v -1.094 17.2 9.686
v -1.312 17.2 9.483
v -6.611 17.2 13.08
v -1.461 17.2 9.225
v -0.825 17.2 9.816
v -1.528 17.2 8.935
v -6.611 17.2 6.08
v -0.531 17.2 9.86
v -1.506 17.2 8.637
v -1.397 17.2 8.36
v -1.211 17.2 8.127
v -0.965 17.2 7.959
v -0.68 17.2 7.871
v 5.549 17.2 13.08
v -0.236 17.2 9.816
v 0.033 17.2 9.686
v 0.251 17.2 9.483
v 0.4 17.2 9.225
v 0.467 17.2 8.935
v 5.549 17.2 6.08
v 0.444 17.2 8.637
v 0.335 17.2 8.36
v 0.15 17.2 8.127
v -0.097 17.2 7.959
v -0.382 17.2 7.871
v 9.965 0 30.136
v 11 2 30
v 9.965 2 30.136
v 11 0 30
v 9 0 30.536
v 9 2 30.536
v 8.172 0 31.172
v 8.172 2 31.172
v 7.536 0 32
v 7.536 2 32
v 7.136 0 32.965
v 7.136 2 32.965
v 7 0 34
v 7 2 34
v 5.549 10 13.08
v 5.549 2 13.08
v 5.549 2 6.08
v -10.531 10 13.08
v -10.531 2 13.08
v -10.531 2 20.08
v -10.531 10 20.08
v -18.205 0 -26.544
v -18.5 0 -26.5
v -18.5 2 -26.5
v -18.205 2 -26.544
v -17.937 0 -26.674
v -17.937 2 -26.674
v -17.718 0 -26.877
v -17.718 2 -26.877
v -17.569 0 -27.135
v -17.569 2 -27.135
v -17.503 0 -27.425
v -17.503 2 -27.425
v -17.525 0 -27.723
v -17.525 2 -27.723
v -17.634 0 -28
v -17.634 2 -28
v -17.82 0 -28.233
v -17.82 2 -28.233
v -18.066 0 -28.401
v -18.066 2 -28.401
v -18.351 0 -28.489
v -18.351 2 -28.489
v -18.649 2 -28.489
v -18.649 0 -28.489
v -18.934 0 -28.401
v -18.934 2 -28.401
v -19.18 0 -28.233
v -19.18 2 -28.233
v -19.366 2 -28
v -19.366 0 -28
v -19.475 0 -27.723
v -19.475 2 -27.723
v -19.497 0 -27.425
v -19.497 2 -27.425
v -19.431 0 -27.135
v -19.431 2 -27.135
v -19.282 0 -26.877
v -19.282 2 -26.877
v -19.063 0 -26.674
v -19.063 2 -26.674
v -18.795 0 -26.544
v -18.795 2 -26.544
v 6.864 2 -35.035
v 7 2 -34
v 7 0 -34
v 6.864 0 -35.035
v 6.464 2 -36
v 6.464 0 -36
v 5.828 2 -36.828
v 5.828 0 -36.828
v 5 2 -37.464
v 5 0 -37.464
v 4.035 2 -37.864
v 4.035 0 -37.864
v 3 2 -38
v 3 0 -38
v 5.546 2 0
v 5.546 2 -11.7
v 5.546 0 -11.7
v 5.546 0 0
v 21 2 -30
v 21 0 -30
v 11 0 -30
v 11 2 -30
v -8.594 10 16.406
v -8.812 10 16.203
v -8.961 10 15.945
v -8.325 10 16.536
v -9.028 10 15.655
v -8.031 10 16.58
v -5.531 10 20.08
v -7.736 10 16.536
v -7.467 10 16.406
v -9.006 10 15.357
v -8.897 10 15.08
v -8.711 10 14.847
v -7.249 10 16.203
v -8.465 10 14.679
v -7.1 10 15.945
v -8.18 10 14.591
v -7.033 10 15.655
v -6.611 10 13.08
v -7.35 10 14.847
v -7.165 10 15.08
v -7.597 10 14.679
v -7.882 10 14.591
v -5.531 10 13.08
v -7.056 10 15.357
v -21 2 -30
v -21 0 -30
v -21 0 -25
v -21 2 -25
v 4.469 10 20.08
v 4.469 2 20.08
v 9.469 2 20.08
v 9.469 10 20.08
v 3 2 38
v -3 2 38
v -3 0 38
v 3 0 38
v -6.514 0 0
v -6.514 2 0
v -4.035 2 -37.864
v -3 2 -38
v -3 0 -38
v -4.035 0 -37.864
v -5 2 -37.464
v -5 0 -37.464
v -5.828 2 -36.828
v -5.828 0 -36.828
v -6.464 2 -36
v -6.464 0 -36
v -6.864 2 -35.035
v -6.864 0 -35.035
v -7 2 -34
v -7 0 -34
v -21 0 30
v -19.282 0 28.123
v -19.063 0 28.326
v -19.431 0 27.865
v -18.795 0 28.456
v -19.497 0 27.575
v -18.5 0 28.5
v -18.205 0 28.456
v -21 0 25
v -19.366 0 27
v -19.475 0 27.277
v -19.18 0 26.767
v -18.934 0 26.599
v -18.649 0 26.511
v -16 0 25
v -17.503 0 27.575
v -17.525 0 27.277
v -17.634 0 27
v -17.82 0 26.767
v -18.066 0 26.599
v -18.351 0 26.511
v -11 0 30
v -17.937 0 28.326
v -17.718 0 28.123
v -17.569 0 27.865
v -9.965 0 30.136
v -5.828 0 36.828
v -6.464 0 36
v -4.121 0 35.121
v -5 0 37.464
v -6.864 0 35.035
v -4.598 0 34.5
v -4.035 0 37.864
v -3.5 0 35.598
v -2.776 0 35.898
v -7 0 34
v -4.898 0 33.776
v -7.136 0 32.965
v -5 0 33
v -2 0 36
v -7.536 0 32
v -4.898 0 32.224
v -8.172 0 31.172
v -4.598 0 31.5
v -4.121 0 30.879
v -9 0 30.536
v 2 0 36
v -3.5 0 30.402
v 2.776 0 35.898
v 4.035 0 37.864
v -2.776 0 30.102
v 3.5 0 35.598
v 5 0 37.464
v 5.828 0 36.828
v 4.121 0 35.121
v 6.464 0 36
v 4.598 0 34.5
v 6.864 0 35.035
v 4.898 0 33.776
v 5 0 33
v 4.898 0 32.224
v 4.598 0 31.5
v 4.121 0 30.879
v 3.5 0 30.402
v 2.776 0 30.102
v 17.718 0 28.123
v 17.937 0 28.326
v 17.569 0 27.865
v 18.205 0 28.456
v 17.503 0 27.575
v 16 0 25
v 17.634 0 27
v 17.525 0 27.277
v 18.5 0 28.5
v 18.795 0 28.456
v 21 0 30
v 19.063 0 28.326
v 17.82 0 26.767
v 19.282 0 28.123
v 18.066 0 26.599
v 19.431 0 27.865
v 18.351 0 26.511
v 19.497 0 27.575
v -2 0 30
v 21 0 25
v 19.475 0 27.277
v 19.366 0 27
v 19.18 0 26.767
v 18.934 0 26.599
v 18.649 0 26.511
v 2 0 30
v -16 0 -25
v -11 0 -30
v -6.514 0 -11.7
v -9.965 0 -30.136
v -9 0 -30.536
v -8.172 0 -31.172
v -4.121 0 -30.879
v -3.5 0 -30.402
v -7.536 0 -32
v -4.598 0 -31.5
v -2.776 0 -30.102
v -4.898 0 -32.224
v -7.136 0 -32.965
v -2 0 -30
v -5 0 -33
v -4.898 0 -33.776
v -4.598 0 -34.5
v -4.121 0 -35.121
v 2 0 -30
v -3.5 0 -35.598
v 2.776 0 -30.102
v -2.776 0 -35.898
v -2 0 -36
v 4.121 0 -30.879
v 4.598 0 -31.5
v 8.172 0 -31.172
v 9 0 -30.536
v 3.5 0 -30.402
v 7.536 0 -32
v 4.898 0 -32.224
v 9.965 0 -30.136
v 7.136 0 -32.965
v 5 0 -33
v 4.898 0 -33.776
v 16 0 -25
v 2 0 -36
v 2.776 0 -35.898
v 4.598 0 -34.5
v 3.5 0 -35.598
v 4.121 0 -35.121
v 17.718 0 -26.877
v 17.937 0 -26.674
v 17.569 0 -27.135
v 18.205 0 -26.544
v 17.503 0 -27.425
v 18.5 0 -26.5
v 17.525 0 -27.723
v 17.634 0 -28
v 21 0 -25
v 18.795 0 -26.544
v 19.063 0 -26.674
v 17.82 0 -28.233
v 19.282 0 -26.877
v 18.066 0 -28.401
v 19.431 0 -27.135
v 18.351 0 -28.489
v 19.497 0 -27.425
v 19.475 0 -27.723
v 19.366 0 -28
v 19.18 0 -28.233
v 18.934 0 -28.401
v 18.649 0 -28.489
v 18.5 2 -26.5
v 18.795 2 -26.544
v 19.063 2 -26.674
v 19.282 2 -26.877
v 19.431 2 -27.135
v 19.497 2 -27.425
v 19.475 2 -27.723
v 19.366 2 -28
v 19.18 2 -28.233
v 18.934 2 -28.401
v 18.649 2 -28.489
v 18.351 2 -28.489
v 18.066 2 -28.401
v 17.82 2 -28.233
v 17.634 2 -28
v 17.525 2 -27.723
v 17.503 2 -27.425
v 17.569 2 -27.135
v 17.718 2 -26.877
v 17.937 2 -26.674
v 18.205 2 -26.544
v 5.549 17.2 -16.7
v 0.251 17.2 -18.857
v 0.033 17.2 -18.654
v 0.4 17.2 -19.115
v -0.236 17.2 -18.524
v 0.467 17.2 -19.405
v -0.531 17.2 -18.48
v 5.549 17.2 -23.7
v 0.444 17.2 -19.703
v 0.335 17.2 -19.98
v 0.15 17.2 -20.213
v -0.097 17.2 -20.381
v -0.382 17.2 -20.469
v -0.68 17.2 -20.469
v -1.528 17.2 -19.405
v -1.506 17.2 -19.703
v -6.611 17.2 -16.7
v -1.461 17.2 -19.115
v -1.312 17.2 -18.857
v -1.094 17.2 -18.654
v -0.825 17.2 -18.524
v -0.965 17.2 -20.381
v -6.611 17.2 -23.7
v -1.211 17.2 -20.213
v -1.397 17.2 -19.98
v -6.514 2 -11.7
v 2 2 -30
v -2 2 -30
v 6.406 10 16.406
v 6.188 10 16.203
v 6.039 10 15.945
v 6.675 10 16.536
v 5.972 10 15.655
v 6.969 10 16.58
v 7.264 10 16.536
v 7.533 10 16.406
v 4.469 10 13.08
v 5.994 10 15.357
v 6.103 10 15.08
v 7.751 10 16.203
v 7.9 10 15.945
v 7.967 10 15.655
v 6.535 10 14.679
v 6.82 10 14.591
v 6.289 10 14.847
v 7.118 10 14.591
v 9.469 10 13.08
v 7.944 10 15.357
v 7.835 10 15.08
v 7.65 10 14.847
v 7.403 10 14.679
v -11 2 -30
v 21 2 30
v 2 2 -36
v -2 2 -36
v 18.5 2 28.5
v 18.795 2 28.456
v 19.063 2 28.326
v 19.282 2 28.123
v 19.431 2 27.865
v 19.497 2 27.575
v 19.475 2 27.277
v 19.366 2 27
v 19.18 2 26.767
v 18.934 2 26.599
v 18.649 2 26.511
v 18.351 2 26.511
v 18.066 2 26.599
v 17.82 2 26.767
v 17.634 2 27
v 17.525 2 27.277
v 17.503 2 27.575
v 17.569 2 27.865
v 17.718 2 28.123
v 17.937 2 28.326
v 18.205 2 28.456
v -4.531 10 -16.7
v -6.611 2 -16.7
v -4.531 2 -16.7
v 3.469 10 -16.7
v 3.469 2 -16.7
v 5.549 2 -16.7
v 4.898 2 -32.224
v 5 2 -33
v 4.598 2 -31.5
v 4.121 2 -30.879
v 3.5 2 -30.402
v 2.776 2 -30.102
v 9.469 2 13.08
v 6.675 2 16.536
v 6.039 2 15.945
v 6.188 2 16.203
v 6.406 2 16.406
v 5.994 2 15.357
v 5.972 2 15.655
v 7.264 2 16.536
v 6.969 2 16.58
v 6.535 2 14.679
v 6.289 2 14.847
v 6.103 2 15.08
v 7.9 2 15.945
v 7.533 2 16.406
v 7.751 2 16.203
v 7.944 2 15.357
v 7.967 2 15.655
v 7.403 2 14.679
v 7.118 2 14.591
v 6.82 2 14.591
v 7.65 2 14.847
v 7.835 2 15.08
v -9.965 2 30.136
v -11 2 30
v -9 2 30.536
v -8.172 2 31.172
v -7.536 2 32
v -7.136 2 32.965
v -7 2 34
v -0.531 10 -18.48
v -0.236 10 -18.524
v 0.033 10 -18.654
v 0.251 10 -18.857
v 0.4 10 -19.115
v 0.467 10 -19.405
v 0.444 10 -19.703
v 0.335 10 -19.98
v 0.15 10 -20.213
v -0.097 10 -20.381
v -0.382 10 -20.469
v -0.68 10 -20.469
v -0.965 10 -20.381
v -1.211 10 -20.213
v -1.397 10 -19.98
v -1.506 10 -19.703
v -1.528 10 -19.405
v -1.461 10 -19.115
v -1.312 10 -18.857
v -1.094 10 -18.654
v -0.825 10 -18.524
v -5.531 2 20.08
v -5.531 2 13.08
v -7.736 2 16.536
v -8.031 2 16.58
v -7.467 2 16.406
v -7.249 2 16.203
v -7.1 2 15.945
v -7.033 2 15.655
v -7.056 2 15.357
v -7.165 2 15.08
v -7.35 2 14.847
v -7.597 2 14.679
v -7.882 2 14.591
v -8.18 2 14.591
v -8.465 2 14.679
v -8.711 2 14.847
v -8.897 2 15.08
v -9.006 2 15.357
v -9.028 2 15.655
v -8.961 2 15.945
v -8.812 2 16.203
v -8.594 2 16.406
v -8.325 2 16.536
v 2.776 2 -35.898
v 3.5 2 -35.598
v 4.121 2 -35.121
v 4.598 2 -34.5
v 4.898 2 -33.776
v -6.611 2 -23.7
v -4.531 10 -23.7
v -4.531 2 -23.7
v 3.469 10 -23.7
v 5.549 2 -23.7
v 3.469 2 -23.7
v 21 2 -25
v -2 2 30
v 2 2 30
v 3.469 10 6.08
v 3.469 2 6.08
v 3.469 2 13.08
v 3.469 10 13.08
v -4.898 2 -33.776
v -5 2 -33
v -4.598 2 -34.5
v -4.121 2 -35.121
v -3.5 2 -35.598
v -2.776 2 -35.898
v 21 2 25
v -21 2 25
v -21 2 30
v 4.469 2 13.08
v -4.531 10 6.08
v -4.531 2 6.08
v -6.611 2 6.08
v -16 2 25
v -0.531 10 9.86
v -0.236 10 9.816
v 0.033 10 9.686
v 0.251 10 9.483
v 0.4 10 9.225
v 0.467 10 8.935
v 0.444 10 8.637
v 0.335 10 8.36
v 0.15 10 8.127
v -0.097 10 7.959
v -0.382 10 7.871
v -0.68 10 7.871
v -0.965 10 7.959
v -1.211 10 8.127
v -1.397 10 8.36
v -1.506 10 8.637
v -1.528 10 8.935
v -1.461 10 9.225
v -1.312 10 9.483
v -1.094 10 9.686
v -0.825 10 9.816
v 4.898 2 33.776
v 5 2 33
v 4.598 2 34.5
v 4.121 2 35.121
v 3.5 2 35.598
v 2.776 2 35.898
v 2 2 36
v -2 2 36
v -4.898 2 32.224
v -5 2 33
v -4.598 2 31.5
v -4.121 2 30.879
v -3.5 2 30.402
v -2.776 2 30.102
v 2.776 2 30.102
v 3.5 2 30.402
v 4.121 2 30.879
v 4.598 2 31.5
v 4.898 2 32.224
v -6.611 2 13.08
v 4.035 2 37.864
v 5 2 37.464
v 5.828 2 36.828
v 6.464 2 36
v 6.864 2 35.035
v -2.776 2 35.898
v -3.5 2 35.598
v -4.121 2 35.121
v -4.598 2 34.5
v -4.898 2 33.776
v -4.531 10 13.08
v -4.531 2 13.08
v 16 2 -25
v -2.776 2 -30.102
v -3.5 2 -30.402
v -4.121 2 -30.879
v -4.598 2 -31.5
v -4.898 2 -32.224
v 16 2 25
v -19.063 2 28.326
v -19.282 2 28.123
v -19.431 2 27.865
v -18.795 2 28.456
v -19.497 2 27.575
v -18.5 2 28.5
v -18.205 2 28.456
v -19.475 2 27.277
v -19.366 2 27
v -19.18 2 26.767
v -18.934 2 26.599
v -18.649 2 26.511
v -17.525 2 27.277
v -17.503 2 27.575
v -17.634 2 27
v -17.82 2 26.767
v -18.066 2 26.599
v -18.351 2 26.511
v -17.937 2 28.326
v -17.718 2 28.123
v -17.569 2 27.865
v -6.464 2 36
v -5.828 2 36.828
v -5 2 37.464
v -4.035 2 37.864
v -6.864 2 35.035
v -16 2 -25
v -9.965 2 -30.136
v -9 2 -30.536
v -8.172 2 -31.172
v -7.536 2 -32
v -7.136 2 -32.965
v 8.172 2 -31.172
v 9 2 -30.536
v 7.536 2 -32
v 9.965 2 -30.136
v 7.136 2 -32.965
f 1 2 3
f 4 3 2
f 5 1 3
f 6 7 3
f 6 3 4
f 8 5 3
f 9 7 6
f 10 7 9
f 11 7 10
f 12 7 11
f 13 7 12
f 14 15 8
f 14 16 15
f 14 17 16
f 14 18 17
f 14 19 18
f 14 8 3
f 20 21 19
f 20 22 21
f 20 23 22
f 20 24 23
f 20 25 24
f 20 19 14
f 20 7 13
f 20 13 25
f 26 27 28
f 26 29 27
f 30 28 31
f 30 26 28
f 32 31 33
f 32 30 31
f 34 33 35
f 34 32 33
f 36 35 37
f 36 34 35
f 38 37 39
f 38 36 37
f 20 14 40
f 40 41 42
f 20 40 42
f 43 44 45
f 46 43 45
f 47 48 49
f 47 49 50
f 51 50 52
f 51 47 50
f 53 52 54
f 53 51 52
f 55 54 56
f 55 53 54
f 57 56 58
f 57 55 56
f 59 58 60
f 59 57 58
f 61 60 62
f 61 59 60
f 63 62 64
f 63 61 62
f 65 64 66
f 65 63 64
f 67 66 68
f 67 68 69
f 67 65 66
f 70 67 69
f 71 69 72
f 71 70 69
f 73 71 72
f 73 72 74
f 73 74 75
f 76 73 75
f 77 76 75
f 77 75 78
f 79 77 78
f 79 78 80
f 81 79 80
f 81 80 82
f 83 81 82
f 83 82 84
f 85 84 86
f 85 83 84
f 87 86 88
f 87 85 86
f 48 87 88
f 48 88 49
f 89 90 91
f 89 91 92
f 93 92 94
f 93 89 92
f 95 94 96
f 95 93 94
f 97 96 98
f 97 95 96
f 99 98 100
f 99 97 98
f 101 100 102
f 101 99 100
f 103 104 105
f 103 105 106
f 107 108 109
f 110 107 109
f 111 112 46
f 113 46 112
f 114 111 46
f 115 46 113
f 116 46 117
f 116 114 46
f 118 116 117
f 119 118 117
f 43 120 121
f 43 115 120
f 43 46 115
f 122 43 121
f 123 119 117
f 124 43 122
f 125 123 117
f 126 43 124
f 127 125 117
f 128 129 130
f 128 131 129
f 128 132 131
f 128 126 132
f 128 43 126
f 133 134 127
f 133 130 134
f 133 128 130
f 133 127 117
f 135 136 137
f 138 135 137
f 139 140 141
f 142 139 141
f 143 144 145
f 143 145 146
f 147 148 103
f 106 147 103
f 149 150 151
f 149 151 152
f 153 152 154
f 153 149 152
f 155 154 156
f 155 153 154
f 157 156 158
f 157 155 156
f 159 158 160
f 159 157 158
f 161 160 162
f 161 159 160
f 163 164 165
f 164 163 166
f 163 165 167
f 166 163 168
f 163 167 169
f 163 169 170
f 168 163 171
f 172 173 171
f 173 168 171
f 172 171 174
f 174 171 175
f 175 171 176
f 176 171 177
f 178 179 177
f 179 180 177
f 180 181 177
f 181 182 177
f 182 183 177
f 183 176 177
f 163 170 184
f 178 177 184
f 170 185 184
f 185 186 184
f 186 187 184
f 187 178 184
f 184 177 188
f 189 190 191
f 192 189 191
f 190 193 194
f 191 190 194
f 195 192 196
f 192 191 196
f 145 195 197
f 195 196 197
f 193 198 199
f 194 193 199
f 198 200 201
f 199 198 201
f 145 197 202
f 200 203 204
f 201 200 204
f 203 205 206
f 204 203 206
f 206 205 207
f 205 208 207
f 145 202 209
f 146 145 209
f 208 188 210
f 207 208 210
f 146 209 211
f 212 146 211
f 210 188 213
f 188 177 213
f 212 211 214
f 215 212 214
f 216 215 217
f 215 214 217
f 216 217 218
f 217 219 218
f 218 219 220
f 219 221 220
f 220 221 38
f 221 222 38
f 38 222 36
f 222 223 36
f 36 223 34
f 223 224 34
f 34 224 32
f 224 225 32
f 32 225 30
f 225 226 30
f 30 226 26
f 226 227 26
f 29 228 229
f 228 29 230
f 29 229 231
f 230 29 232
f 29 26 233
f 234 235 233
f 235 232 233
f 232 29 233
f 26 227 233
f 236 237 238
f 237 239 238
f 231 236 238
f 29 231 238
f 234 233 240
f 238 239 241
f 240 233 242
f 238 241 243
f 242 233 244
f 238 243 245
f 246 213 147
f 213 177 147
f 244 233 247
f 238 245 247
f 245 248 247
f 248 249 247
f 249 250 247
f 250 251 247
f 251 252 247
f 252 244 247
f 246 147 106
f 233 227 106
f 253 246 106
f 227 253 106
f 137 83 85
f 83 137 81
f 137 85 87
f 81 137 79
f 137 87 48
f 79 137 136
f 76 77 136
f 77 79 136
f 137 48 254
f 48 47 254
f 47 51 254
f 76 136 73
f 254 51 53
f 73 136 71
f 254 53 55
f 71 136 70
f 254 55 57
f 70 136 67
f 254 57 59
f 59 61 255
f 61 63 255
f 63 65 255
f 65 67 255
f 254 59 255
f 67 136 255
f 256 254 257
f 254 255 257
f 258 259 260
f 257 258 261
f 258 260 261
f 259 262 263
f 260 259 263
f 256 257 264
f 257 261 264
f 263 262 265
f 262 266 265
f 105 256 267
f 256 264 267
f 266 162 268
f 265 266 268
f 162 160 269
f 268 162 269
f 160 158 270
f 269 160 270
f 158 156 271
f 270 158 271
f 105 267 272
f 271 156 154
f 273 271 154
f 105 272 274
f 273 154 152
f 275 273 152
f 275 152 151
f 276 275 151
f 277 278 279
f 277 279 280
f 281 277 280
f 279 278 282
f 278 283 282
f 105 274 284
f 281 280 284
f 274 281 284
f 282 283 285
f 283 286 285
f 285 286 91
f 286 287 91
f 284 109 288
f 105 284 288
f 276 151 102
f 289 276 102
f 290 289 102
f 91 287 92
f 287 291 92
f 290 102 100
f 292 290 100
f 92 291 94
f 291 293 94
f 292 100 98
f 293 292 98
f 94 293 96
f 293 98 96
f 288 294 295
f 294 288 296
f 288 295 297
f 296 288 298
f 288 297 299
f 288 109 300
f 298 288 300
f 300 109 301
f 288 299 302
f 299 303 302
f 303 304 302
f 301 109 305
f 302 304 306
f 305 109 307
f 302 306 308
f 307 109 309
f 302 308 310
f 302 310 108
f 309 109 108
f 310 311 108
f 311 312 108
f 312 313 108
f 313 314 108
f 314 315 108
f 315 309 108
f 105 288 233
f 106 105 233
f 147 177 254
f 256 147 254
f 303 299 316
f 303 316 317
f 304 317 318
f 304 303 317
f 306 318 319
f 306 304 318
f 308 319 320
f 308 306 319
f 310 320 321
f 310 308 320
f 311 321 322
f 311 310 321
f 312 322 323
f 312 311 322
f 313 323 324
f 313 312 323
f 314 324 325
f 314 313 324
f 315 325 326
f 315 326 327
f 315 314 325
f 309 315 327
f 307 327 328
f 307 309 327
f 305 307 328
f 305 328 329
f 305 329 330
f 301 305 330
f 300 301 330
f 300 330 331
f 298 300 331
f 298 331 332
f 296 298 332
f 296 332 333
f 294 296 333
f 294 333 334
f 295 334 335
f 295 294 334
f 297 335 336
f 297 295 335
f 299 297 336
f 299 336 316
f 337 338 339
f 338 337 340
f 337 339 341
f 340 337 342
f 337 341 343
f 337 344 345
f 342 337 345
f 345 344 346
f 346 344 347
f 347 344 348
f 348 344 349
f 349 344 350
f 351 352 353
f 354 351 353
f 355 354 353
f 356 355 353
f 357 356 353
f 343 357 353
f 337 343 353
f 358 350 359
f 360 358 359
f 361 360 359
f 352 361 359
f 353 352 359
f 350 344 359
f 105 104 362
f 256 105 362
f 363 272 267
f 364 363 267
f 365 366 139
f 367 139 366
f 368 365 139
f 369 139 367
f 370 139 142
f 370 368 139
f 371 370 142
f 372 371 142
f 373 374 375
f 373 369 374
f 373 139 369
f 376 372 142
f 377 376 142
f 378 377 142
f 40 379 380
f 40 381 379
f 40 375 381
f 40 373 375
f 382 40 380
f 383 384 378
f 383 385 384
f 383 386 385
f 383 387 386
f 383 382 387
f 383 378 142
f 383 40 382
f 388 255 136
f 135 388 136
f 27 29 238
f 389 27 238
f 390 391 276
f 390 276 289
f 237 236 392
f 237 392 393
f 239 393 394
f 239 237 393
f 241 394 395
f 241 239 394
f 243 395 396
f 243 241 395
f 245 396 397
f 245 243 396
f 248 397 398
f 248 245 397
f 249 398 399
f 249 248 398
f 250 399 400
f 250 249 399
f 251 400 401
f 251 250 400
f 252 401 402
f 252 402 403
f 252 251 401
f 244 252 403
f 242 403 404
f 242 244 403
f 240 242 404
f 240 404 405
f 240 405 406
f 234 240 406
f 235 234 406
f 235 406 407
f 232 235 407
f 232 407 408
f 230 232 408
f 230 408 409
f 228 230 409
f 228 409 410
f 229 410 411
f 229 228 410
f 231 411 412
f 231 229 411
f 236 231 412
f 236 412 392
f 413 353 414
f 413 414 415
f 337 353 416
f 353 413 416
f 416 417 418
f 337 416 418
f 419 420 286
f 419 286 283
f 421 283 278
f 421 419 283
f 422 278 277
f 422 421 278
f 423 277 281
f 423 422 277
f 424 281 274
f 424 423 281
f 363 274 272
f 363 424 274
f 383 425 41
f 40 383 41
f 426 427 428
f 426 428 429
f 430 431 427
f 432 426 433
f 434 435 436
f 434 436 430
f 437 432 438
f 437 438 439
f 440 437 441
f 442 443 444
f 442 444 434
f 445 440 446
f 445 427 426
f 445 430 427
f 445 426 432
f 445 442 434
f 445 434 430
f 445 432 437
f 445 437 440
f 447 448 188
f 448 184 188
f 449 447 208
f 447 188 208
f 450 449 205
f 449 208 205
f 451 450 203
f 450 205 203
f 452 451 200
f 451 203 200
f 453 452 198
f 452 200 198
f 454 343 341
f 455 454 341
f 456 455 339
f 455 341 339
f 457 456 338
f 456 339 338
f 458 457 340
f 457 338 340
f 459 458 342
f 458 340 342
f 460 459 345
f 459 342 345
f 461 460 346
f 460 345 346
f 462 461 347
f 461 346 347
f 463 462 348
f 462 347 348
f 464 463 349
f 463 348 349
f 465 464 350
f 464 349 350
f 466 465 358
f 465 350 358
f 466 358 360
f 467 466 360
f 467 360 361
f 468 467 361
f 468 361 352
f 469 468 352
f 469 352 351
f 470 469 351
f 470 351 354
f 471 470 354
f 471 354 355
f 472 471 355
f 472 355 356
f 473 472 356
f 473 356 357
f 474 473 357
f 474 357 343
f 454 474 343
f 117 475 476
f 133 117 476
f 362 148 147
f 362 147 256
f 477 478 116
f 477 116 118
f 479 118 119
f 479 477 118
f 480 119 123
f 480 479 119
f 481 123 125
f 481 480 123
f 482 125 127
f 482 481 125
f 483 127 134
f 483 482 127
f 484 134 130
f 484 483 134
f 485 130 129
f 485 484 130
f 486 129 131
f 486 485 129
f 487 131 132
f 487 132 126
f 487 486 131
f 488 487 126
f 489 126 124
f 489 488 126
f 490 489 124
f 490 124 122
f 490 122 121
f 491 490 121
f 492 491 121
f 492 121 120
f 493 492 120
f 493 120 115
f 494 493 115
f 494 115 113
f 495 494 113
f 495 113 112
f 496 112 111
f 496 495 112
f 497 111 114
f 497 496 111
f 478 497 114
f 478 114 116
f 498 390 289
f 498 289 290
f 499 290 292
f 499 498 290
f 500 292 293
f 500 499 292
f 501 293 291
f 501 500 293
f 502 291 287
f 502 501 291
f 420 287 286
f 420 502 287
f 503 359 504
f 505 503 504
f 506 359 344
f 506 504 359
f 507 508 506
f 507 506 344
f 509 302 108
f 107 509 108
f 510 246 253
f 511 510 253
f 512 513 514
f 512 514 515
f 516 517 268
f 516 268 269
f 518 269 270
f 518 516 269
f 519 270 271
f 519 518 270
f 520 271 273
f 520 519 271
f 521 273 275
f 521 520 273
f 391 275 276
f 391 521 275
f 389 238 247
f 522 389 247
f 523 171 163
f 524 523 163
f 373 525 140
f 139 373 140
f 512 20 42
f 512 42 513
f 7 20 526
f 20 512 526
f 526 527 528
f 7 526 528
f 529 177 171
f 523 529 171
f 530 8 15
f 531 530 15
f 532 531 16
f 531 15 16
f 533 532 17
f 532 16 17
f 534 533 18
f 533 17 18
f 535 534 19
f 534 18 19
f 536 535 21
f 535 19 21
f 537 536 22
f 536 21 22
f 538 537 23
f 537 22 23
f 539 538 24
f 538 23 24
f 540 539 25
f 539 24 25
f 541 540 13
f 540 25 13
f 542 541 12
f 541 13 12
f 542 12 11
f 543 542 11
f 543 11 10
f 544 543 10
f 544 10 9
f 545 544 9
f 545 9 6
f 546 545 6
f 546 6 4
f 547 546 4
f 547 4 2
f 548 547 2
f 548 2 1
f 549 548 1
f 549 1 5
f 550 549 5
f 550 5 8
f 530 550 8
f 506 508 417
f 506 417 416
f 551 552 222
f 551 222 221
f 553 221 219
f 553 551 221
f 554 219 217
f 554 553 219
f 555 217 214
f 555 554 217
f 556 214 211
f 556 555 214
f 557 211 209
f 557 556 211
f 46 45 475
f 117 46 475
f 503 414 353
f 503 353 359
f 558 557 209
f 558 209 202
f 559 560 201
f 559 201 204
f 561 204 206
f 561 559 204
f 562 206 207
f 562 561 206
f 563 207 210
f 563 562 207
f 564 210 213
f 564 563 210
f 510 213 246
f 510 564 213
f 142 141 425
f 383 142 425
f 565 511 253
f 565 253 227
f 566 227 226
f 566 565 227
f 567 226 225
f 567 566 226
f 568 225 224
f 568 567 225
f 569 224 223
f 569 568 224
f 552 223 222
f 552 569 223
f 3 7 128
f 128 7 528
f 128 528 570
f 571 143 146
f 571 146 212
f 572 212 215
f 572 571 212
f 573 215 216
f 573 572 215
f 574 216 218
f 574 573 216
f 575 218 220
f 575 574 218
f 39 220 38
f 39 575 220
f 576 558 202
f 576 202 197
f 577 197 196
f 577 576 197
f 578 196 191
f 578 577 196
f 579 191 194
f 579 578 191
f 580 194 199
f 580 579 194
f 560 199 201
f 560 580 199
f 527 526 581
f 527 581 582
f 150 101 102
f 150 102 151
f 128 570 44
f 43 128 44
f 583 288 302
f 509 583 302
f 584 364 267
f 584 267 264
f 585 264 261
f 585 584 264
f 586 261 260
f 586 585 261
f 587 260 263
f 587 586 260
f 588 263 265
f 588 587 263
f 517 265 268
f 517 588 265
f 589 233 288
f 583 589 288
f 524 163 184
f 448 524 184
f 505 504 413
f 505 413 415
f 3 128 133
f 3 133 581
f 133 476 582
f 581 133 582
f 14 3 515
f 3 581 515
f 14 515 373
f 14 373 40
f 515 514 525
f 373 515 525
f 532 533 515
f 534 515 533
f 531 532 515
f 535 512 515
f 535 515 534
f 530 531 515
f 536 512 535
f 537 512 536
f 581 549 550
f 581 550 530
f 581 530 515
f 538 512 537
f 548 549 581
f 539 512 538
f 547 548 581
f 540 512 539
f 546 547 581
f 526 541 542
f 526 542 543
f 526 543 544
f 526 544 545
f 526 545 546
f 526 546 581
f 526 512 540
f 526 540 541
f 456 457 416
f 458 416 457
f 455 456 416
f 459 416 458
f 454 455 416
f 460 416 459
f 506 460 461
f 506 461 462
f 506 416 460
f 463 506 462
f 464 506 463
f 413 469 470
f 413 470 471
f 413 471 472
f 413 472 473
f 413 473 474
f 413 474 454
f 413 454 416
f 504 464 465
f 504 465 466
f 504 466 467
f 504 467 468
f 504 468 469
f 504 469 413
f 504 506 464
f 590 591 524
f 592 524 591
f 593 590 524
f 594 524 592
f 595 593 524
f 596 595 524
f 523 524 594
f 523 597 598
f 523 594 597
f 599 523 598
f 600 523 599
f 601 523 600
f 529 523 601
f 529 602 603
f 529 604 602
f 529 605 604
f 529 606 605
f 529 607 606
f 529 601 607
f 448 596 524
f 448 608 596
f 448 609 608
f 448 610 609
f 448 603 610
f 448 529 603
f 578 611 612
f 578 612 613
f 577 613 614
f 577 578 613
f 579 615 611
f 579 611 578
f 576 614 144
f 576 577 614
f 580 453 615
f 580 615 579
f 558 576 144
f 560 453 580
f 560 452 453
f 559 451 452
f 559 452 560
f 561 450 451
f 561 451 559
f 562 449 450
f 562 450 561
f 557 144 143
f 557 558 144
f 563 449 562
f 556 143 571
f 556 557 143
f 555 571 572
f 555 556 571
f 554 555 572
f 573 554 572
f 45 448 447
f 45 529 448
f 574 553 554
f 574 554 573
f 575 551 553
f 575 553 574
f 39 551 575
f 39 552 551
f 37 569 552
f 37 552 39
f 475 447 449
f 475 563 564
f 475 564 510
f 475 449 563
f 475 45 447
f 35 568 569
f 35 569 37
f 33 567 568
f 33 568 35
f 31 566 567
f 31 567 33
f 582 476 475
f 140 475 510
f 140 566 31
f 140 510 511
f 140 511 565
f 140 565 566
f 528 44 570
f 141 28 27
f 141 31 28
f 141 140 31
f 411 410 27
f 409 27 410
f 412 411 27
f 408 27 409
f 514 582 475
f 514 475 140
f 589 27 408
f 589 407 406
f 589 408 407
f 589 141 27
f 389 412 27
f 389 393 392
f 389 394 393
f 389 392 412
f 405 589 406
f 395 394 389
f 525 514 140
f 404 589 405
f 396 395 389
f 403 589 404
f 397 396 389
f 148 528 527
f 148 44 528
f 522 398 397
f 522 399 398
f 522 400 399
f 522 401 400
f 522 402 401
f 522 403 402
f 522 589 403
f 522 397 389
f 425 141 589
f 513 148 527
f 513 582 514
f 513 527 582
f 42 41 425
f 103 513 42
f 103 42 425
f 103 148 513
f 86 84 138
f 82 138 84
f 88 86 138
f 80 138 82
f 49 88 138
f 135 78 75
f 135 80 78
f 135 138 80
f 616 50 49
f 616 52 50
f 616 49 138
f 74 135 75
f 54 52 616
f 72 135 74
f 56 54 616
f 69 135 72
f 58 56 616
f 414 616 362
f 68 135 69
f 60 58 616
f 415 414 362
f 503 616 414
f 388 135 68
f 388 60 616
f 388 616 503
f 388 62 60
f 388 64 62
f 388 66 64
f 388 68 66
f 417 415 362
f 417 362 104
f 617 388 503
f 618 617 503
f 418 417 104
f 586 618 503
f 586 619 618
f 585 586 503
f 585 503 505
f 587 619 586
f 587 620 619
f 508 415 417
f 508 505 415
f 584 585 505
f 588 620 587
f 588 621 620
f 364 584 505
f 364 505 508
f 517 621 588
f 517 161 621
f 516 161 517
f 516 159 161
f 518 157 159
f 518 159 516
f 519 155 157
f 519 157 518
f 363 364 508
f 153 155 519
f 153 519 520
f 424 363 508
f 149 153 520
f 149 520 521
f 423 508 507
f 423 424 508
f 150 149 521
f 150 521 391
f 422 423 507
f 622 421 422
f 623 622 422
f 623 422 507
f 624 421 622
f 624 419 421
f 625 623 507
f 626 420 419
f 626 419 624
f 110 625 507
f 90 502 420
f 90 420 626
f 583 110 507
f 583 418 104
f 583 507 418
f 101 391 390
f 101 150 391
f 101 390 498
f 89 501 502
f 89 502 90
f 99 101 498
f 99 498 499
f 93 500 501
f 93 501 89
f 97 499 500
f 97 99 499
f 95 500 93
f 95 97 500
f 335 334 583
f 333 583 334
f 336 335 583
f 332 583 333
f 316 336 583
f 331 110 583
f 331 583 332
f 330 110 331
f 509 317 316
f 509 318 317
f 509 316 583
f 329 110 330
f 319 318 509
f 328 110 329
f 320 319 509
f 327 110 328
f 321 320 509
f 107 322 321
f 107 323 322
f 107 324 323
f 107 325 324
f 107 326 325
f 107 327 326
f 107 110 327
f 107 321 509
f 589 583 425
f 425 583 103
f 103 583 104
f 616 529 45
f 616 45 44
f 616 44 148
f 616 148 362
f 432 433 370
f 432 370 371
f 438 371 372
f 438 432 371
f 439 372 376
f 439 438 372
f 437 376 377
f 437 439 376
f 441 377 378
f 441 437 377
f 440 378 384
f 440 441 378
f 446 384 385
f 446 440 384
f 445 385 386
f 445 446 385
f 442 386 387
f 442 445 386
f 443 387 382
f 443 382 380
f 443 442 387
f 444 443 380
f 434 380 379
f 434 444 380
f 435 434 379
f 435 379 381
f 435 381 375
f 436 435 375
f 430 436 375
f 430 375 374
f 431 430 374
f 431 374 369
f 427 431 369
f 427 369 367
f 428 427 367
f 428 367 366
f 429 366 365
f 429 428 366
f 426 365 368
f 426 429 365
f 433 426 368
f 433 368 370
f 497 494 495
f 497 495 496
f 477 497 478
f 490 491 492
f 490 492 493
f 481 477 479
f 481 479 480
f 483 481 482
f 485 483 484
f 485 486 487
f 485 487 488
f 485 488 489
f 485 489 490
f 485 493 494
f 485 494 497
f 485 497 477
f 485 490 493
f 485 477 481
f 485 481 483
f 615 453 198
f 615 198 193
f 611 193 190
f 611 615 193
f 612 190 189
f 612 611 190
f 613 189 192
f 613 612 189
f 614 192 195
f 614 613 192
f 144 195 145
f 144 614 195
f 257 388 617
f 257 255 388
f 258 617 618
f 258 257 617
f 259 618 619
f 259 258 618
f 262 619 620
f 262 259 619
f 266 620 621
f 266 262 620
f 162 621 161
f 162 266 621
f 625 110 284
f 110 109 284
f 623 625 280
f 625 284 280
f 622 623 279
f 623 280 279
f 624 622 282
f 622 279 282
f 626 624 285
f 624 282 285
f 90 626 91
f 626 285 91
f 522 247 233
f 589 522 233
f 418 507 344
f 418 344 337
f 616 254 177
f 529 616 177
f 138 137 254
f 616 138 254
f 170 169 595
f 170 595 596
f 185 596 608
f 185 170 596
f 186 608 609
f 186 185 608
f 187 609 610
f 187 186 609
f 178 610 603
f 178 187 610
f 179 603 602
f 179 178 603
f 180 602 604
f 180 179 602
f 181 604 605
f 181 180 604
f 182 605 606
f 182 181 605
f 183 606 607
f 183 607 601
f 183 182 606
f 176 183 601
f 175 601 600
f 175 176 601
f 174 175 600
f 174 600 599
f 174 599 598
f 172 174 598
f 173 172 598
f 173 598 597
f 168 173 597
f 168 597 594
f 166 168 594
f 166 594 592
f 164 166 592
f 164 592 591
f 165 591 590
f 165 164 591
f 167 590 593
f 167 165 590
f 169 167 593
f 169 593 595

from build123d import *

# Parameters (mm, degrees)
CROQUIS1_R                 = 1
SALIENTE_EXTRUIR2_DEPTH    = 2
SALIENTE_EXTRUIR3_DEPTH    = 15.2
CROQUIS3_R                 = 1
CORTAR_EXTRUIR1_DEPTH      = 8
CROQUIS4_R                 = 1
SALIENTE_EXTRUIR4_DEPTH    = 8
CORTAR_EXTRUIR2_DEPTH      = 51.918821667
CORTAR_EXTRUIR2_DEPTH_BACK = 51.918821667
SALIENTE_EXTRUIR6_DEPTH    = 2
REDONDEO1_R                = 4
CORTAR_EXTRUIR3_DEPTH      = 10


with BuildPart() as part:
    # Croquis1 → Saliente-Extruir2 (new body)
    with BuildSketch(Plane(origin=(0, 0, 0), x_dir=(1, 0, 0), z_dir=(0, 1, 0))):
        Polygon((-21, 30), (-21, 25), (-16, 25), (-16, -25), (-21, -25), (-21, -30), (21, -30), (21, -25), (16, -25), (16, 25), (21, 25), (21, 30), align=None)
        with Locations(Location((-18.5, -27.5, 0), (0, 0, 270))):
            Circle(CROQUIS1_R, mode=Mode.SUBTRACT)
        with Locations(Location((-18.5, 27.5, 0), (0, 0, 270))):
            Circle(CROQUIS1_R, mode=Mode.SUBTRACT)
        with Locations(Location((18.5, 27.5, 0), (0, 0, 270))):
            Circle(CROQUIS1_R, mode=Mode.SUBTRACT)
        with Locations(Location((18.5, -27.5, 0), (0, 0, 270))):
            Circle(CROQUIS1_R, mode=Mode.SUBTRACT)
    extrude(amount=SALIENTE_EXTRUIR2_DEPTH)

    # Croquis2 → Saliente-Extruir3 (add)
    with BuildSketch(Plane(origin=(0, 2, 0), x_dir=(1, 0, 0), z_dir=(0, 1, 0))):
        Polygon((5.549377546, 23.7), (5.549377546, 16.7), (-0.530622454, 16.7), (-6.610622454, 16.7), (-6.610622454, 23.7), align=None)
        Polygon((-6.610622454, -13.08), (5.549377546, -13.08), (5.549377546, -6.08), (-0.530622454, -6.08), (-6.610622454, -6.08), align=None)
    extrude(amount=SALIENTE_EXTRUIR3_DEPTH)

    # Croquis3 → Cortar-Extruir1 (cut)
    with BuildSketch(Plane(origin=(0, 17.2, 0), x_dir=(1, 0, 0), z_dir=(0, 1, 0))):
        with Locations(Location((-0.530622454, 19.48, 0), (0, 0, 270))):
            Circle(CROQUIS3_R)
        with Locations(Location((-0.530622454, -8.86, 0), (0, 0, 270))):
            Circle(CROQUIS3_R)
    extrude(amount=-CORTAR_EXTRUIR1_DEPTH, mode=Mode.SUBTRACT)

    # Croquis4 → Saliente-Extruir4 (add)
    # profile 1 of 2: a face of its own
    with BuildSketch(Plane(origin=(0, 2, 0), x_dir=(1, 0, 0), z_dir=(0, 1, 0))):
        Polygon((-5.530622454, -20.08), (-5.530622454, -13.08), (-6.610622454, -13.08), (-10.530622454, -13.08), (-10.530622454, -20.08), align=None)
        with Locations(Location((-8.030622454, -15.58, 0), (0, 0, 270))):
            Circle(CROQUIS4_R, mode=Mode.SUBTRACT)
    # profile 2 of 2: a face of its own
    with BuildSketch(Plane(origin=(0, 2, 0), x_dir=(1, 0, 0), z_dir=(0, 1, 0))):
        Polygon((9.469377546, -20.08), (9.469377546, -13.08), (5.549377546, -13.08), (4.469377546, -13.08), (4.469377546, -20.08), align=None)
        with Locations(Location((6.969377546, -15.58, 0), (0, 0, 270))):
            Circle(CROQUIS4_R, mode=Mode.SUBTRACT)
    extrude(amount=SALIENTE_EXTRUIR4_DEPTH)

    # Croquis5 → Cortar-Extruir2 (cut, two sides: drawn at the far end of the back side and taken through both)
    with BuildSketch(Plane.XY.offset(13.08).offset(-CORTAR_EXTRUIR2_DEPTH_BACK)):
        Polygon((-4.530622454, 2), (-0.530622454, 2), (3.469377546, 2), (3.469377546, 10), (-4.530622454, 10), align=None)
    extrude(amount=CORTAR_EXTRUIR2_DEPTH + CORTAR_EXTRUIR2_DEPTH_BACK, mode=Mode.SUBTRACT)

    # Croquis6 → Saliente-Extruir6 (add)
    with BuildSketch(Plane(origin=(0, 2, 0), x_dir=(1, 0, 0), z_dir=(0, 1, 0))):
        with BuildLine():
            Line((3.5, 30), (5, 30))
            Line((5, 30), (7, 30))
            Line((7, 30), (7, 34))
            ThreePointArc((7, 34), (5.828427125, 36.828427125), (3, 38))
            Line((3, 38), (-3, 38))
            ThreePointArc((-3, 38), (-5.828427125, 36.828427125), (-7, 34))
            Line((-7, 34), (-7, 30))
            Line((-7, 30), (-5, 30))
            Line((-5, 30), (-3.5, 30))
            Line((-3.5, 30), (-2, 30))
            ThreePointArc((-2, 30), (-4.121320344, 30.878679656), (-5, 33))
            ThreePointArc((-5, 33), (-4.121320344, 35.121320344), (-2, 36))
            Line((-2, 36), (0, 36))
            Line((0, 36), (2, 36))
            ThreePointArc((2, 36), (4.121320344, 35.121320344), (5, 33))
            ThreePointArc((5, 33), (4.121320344, 30.878679656), (2, 30))
            Line((2, 30), (3.5, 30))
        make_face()
        with BuildLine():
            Line((7, -34), (7, -30))
            Line((7, -30), (5, -30))
            Line((5, -30), (3.5, -30))
            Line((3.5, -30), (2, -30))
            ThreePointArc((2, -30), (4.121320344, -30.878679656), (5, -33))
            ThreePointArc((5, -33), (4.121320344, -35.121320344), (2, -36))
            Line((2, -36), (0, -36))
            Line((0, -36), (-2, -36))
            ThreePointArc((-2, -36), (-4.121320344, -35.121320344), (-5, -33))
            ThreePointArc((-5, -33), (-4.121320344, -30.878679656), (-2, -30))
            Line((-2, -30), (-3.5, -30))
            Line((-3.5, -30), (-5, -30))
            Line((-5, -30), (-7, -30))
            Line((-7, -30), (-7, -34))
            ThreePointArc((-7, -34), (-5.828427125, -36.828427125), (-3, -38))
            Line((-3, -38), (3, -38))
            ThreePointArc((3, -38), (5.828427125, -36.828427125), (7, -34))
        make_face()
    extrude(amount=-SALIENTE_EXTRUIR6_DEPTH)

    # Redondeo1
    redondeo1_edges = [part.edges().sort_by_distance(p)[0] for p in [
        (7, 1, -30),
        (-7, 1, -30),
        (-7, 1, 30),
        (7, 1, 30),
    ]]
    fillet(redondeo1_edges, radius=REDONDEO1_R - 0.0001)  # a hair under: the kernel refuses the full size

    # Croquis7 → Cortar-Extruir3 (cut)
    with BuildSketch(Plane(origin=(0, 2, 0), x_dir=(1, 0, 0), z_dir=(0, 1, 0))):
        Polygon((0, 0), (-6.51429836, 0), (-6.51429836, 11.7), (0, 11.7), (5.54570164, 11.7), (5.54570164, 0), align=None)
    extrude(amount=-CORTAR_EXTRUIR3_DEPTH, mode=Mode.SUBTRACT)


solid = part.part
